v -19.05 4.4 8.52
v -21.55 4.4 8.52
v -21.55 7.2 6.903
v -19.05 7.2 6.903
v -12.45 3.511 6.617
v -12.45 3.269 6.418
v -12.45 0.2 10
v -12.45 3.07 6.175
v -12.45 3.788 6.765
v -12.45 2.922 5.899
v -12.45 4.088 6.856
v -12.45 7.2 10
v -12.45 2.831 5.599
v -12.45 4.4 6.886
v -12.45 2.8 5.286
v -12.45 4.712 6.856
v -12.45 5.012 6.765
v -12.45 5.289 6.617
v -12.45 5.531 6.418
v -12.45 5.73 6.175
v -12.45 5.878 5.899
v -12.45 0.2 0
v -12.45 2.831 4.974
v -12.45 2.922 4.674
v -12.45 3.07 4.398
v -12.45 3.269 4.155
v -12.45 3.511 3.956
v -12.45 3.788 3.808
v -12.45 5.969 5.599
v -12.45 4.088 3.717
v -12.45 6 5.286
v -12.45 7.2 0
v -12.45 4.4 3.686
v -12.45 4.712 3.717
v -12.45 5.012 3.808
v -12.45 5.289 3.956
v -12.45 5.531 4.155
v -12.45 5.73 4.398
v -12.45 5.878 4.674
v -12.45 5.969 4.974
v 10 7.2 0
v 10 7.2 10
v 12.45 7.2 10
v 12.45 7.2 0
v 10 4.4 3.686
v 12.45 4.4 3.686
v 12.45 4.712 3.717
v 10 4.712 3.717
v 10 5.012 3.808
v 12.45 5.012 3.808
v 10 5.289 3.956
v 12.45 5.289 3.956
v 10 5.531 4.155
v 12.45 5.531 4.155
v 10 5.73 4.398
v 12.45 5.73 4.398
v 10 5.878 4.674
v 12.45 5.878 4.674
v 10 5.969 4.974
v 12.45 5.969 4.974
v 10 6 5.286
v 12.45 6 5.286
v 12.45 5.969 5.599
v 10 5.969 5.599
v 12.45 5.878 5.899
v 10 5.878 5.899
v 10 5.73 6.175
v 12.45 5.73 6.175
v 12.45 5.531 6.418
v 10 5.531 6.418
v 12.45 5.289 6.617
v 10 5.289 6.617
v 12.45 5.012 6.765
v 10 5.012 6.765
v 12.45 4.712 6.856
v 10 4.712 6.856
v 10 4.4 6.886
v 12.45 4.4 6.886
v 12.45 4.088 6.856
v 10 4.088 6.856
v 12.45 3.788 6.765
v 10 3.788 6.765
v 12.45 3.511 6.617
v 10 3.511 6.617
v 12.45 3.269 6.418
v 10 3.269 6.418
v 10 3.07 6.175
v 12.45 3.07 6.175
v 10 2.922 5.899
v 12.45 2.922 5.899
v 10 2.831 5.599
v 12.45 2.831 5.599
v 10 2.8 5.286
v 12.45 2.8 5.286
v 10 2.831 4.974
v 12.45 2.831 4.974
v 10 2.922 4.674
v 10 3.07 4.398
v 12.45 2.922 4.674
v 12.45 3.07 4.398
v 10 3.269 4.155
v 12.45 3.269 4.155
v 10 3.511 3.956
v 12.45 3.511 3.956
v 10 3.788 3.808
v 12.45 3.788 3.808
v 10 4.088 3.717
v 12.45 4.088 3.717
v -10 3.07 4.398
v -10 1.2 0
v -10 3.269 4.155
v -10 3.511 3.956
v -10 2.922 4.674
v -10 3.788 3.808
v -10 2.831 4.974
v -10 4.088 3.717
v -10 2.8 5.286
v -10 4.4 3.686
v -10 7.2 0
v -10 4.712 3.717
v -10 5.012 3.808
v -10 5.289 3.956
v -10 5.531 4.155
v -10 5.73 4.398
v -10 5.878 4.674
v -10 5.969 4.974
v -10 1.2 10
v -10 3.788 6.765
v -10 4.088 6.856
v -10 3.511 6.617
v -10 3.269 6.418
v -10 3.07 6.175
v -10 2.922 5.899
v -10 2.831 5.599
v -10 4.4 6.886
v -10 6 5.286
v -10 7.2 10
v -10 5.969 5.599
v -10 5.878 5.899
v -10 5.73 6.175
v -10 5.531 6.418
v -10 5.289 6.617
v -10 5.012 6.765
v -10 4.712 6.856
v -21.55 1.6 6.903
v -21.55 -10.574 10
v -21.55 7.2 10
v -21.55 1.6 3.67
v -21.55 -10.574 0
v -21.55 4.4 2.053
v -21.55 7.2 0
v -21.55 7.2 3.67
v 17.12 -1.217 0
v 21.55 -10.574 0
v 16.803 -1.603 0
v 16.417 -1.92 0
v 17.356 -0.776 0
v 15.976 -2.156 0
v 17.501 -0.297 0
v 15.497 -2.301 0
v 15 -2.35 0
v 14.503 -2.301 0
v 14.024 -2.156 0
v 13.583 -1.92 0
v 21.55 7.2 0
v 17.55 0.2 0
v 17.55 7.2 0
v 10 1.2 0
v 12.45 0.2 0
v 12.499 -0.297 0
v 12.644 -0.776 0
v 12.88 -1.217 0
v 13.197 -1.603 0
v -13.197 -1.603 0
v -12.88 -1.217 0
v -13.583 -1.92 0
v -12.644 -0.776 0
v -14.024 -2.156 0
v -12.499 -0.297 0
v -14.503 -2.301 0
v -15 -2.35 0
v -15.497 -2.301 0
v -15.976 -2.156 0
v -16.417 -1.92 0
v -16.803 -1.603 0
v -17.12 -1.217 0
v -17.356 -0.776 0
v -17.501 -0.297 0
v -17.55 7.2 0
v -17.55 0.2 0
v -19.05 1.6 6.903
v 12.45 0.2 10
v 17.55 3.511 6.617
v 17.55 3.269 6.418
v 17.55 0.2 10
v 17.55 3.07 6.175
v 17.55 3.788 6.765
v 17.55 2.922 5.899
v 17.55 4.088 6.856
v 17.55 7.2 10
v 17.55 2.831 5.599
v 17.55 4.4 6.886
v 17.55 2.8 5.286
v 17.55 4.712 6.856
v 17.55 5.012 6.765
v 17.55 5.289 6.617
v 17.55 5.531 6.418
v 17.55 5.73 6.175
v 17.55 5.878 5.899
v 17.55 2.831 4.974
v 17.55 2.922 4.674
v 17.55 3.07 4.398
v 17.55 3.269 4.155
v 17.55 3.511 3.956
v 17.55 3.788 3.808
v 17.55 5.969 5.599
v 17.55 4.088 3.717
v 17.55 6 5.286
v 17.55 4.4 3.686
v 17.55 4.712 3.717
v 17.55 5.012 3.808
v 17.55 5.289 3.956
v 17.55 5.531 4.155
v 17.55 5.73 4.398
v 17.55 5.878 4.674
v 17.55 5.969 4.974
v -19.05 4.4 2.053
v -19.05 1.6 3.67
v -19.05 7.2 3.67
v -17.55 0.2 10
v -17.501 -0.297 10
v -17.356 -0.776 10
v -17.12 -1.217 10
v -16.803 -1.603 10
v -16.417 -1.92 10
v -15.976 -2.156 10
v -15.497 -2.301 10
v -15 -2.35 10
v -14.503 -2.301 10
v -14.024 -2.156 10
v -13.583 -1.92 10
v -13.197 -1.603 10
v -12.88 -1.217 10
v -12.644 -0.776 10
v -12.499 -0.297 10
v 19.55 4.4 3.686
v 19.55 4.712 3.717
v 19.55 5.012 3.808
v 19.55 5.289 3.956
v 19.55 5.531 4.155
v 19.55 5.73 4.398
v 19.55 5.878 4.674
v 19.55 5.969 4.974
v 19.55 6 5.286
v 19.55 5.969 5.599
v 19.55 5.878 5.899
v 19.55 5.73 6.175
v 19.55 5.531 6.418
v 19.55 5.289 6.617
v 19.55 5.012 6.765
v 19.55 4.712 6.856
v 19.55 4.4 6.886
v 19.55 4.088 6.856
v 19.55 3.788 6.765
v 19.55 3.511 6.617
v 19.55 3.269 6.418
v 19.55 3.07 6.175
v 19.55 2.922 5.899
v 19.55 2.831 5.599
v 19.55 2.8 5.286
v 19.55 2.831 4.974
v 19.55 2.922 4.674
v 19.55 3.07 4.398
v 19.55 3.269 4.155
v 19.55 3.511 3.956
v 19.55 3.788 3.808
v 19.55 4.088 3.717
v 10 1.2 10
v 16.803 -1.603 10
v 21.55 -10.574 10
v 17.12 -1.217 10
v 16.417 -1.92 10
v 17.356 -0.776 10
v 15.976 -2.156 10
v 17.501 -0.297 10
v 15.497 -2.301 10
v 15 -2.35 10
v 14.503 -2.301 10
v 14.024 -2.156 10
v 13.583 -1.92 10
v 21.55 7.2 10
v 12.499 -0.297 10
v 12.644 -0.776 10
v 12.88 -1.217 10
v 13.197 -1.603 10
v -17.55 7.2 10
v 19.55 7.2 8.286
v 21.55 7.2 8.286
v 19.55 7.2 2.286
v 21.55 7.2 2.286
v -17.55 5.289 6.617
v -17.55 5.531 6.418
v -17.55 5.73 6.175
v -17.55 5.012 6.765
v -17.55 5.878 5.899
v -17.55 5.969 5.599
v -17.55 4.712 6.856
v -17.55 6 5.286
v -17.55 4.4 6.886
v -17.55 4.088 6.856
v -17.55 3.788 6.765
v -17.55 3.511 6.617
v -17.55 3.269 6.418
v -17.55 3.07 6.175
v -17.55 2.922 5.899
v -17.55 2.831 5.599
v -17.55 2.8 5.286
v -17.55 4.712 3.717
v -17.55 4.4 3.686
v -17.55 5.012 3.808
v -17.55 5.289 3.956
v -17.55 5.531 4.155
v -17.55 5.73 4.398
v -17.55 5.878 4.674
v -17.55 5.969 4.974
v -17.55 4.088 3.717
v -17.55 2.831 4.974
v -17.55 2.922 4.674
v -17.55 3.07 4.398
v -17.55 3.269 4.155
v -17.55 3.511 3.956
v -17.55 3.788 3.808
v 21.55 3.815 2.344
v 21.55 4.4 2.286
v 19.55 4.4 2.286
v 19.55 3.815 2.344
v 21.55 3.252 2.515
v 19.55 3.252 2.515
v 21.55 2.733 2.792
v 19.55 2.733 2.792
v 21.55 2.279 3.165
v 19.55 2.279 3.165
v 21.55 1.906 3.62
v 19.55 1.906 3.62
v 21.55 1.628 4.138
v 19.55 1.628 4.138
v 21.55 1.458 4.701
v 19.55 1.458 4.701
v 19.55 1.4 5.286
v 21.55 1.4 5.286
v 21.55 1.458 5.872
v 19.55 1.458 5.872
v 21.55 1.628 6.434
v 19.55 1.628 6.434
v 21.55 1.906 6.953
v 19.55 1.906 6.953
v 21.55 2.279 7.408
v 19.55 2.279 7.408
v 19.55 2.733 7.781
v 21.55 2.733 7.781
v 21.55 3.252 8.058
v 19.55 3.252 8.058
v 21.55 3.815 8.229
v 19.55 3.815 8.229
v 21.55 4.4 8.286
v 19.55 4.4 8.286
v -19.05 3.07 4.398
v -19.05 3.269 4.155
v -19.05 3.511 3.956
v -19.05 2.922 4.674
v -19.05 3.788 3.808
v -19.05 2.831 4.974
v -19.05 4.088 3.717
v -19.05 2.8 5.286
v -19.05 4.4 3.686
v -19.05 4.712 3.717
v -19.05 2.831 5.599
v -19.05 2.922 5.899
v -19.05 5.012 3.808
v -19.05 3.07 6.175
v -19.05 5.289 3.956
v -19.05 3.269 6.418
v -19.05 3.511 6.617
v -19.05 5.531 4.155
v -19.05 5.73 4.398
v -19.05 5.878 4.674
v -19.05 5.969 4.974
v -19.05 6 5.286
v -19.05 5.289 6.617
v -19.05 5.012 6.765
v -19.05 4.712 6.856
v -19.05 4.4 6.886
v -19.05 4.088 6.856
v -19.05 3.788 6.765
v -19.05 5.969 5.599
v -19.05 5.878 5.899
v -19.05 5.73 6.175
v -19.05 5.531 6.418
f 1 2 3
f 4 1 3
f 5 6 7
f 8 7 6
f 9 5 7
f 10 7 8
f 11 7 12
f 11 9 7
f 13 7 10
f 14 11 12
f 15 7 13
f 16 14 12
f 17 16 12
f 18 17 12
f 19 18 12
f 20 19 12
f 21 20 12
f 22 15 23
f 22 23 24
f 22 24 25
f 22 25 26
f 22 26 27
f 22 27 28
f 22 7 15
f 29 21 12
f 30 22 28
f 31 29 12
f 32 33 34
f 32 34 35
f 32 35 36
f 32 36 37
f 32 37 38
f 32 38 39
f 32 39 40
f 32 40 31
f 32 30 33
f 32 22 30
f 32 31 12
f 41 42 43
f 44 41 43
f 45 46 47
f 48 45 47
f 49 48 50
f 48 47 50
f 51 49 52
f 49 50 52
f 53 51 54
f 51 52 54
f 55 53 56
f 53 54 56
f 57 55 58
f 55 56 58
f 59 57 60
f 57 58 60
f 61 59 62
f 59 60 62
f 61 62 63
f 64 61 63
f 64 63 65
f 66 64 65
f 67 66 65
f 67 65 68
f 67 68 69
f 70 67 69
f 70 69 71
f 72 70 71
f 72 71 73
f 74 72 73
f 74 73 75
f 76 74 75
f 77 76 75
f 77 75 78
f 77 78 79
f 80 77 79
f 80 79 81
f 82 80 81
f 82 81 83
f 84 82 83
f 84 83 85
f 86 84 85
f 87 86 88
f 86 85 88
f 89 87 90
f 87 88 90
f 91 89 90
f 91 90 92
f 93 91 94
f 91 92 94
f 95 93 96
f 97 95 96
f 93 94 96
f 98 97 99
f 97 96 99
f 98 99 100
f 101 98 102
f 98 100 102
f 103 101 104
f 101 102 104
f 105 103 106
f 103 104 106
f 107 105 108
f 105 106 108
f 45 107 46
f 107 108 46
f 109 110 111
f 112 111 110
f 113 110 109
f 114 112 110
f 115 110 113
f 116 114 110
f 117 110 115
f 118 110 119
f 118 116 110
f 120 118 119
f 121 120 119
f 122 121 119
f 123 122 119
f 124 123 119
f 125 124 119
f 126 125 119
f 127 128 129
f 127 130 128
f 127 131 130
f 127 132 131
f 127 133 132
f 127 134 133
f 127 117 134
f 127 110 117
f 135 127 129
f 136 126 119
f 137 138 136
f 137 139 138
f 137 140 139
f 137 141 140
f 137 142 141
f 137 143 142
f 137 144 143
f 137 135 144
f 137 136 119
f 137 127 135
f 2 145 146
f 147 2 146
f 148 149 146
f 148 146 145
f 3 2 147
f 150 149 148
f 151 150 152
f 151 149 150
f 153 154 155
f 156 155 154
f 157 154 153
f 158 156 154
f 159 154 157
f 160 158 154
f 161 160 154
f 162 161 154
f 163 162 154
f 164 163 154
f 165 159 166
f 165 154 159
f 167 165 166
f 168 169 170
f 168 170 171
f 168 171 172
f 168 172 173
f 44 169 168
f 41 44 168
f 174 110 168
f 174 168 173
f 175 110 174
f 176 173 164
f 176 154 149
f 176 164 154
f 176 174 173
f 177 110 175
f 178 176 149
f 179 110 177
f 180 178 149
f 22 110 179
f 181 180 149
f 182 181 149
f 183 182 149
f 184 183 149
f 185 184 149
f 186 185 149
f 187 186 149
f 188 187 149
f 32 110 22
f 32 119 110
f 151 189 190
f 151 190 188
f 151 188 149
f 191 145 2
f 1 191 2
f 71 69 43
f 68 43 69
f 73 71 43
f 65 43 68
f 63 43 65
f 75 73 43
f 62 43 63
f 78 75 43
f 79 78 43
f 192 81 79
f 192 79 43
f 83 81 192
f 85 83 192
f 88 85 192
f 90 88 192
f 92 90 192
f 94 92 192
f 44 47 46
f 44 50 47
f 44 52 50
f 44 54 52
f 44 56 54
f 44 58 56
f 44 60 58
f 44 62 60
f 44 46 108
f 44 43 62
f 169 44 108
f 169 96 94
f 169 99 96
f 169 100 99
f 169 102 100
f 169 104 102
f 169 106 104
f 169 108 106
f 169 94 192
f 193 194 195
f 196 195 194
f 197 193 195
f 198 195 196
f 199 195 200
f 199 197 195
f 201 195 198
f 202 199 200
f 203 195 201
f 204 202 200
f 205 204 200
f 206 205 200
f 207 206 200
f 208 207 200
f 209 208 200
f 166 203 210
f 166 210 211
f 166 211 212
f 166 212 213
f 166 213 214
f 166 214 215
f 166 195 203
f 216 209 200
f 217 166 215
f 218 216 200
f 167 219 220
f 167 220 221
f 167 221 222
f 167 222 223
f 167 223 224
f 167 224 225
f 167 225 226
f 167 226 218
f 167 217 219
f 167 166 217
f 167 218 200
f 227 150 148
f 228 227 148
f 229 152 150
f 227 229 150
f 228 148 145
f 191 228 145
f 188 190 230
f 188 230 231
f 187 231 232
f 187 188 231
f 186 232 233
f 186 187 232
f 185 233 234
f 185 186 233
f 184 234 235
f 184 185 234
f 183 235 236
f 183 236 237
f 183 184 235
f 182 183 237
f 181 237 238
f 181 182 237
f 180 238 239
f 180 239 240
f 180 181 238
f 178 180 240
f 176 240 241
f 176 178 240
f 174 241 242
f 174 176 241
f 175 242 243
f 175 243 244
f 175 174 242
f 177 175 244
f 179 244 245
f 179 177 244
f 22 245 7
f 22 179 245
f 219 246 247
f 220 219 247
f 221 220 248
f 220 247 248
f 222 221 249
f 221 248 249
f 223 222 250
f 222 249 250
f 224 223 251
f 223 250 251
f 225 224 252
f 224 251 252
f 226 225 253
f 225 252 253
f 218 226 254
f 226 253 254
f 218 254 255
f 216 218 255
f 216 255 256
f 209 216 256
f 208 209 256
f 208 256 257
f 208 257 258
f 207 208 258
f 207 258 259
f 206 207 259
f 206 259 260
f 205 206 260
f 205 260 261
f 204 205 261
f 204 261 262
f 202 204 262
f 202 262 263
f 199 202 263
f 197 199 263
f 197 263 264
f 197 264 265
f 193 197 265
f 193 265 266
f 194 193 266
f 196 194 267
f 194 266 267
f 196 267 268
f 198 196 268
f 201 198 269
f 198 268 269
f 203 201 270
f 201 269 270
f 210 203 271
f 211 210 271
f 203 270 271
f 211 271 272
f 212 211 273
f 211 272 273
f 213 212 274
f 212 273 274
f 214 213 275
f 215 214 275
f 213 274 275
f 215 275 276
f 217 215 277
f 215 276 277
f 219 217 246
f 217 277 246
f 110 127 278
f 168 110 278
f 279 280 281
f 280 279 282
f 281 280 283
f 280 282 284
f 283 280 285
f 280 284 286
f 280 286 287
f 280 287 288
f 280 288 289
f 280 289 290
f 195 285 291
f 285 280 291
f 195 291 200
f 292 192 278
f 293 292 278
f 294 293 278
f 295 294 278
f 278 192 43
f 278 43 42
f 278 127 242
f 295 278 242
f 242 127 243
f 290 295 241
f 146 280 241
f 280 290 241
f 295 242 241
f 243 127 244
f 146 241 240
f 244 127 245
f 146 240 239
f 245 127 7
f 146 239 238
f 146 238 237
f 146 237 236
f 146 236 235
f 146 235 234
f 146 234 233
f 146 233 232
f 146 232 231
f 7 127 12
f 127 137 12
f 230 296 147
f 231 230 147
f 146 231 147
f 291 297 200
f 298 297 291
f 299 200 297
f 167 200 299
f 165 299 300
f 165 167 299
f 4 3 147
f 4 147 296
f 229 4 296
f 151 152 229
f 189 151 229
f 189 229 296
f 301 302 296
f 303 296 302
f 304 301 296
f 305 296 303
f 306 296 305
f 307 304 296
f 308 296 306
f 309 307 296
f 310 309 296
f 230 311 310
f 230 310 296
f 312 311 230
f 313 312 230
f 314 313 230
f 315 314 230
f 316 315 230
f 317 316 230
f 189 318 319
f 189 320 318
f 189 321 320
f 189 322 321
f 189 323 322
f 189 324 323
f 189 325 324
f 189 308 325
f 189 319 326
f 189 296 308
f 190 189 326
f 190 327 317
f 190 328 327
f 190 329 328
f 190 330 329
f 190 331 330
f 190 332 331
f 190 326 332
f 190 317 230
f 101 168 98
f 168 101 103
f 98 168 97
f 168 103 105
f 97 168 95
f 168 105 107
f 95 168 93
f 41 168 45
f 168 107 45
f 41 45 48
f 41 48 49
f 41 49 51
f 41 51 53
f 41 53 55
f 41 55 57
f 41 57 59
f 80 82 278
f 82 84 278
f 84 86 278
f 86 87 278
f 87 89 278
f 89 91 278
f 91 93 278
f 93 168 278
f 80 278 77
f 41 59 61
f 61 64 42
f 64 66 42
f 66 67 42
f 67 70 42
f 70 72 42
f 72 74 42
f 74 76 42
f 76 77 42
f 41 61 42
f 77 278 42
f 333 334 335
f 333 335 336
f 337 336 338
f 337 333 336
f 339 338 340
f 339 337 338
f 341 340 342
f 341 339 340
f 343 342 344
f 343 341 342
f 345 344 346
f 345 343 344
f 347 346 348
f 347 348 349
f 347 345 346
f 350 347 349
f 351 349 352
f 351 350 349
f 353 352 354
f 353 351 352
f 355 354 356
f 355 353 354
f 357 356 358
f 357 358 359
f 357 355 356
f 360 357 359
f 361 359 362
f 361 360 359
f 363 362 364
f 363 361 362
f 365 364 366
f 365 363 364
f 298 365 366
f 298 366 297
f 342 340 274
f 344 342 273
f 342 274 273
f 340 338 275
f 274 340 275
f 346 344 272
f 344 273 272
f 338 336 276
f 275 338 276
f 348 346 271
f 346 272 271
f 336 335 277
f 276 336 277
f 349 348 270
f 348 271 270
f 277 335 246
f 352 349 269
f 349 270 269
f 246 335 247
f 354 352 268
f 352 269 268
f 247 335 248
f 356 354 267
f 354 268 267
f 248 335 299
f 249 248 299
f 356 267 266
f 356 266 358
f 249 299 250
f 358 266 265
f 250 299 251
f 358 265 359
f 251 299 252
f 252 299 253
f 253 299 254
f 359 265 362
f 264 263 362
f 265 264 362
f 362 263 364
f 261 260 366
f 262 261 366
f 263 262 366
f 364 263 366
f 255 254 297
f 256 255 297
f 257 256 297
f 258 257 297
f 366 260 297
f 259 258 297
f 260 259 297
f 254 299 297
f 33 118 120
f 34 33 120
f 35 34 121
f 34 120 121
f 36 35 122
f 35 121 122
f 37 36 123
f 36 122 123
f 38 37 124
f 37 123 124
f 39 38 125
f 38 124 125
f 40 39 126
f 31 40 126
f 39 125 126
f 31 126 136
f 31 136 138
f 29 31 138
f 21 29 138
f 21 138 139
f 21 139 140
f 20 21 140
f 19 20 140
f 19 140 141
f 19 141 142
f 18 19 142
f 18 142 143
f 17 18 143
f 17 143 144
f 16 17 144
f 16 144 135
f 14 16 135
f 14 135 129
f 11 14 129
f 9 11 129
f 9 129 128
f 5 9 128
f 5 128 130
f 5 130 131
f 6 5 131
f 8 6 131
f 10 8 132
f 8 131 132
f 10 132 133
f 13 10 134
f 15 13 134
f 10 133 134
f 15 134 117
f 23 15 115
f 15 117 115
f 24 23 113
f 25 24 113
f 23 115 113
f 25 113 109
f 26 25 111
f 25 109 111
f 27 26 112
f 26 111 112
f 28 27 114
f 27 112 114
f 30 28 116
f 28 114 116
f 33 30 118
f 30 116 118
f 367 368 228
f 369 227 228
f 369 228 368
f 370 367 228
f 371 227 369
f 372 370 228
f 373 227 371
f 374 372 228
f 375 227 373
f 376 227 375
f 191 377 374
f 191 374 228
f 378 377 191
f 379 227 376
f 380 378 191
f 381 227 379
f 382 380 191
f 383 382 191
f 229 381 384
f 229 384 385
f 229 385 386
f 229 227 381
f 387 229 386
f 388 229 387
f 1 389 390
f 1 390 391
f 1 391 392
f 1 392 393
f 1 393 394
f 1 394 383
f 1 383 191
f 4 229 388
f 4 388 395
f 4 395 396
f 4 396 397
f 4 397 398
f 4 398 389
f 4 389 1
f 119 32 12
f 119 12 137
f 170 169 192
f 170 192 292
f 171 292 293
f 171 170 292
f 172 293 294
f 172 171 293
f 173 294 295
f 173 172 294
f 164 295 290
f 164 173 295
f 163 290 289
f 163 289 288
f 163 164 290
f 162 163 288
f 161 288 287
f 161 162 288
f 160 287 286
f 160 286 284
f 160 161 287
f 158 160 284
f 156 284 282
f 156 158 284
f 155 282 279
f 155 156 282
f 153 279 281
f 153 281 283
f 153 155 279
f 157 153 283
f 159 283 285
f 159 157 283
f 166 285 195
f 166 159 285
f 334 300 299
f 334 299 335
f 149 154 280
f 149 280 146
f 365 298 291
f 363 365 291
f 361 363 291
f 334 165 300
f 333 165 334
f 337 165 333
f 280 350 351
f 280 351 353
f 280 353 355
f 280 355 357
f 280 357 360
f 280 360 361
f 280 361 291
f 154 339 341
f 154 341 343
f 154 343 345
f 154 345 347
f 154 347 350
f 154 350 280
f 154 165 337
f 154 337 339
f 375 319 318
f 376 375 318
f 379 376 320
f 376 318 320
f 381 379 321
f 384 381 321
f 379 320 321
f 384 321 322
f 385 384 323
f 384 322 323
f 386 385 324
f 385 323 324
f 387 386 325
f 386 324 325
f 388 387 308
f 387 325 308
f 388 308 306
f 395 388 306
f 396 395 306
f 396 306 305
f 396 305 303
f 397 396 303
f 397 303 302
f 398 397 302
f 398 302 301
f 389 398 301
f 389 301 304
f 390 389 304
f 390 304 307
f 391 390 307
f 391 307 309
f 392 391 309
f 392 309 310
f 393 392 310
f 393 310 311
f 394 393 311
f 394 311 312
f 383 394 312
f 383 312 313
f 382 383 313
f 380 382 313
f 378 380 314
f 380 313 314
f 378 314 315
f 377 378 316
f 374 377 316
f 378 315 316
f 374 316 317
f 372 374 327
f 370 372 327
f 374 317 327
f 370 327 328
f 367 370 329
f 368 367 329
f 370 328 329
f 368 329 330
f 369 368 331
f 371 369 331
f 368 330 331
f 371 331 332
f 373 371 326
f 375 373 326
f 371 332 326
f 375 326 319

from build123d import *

# Parameters (mm, degrees)
BOSS_EXTRUDE1_DEPTH = 10
SKETCH2_R           = 1.6
CUT_EXTRUDE1_DEPTH  = 44.1
CUT_EXTRUDE2_DEPTH  = 2
CUT_EXTRUDE3_DEPTH  = 2.5
SKETCH6_W           = 20
SKETCH6_H           = 6
CUT_EXTRUDE4_DEPTH  = 11


with BuildPart() as part:
    # Sketch1 → Boss-Extrude1 (new body)
    with BuildSketch(Plane.XY):
        with BuildLine():
            Line((-21.55, 7.2), (-17.55, 7.2))
            Line((-17.55, 7.2), (-17.55, 0.2))
            ThreePointArc((-17.55, 0.2), (-15, -2.35), (-12.45, 0.2))
            Line((-12.45, 0.2), (-12.45, 7.2))
            Line((-12.45, 7.2), (12.45, 7.2))
            Line((12.45, 7.2), (12.45, 0.2))
            ThreePointArc((12.45, 0.2), (15, -2.35), (17.55, 0.2))
            Line((17.55, 0.2), (17.55, 7.2))
            Line((17.55, 7.2), (21.55, 7.2))
            Line((21.55, 7.2), (21.55, -10.574417152))
            Line((21.55, -10.574417152), (-21.55, -10.574417152))
            Line((-21.55, -10.574417152), (-21.55, 7.2))
        make_face()
    extrude(amount=BOSS_EXTRUDE1_DEPTH)

    # Sketch2 → Cut-Extrude1 (cut, through all)
    with BuildSketch(Plane(origin=(21.55, 0, 0), x_dir=(0, 0, -1), z_dir=(1, 0, 0))):
        with Locations((-5.28643622, 4.4)):
            Circle(SKETCH2_R)
    extrude(amount=-CUT_EXTRUDE1_DEPTH, mode=Mode.SUBTRACT)

    # Sketch3 → Cut-Extrude2 (cut)
    with BuildSketch(Plane(origin=(21.55, 0, 0), x_dir=(0, 0, -1), z_dir=(1, 0, 0))):
        with BuildLine():
            Line((-8.28643622, 7.2), (-2.28643622, 7.2))
            Line((-2.28643622, 7.2), (-2.28643622, 4.4))
            ThreePointArc((-2.28643622, 4.4), (-5.28643622, 1.4), (-8.28643622, 4.4))
            Line((-8.28643622, 4.4), (-8.28643622, 7.2))
        make_face()
    extrude(amount=-CUT_EXTRUDE2_DEPTH, mode=Mode.SUBTRACT)

    # Sketch4 → Cut-Extrude3 (cut)
    with BuildSketch(Plane.ZY.offset(21.55)):
        Polygon((8.519597728, 4.4), (6.903016974, 7.2), (3.669855466, 7.2), (2.053274713, 4.4), (3.669855466, 1.6), (6.903016974, 1.6), align=None)
    extrude(amount=-CUT_EXTRUDE3_DEPTH, mode=Mode.SUBTRACT)

    # Sketch6 → Cut-Extrude4 (cut, through all)
    with BuildSketch(Plane.XY.offset(10)):
        with Locations((0, 4.2)):
            Rectangle(SKETCH6_W, SKETCH6_H)
    extrude(amount=-CUT_EXTRUDE4_DEPTH, mode=Mode.SUBTRACT)


solid = part.part
